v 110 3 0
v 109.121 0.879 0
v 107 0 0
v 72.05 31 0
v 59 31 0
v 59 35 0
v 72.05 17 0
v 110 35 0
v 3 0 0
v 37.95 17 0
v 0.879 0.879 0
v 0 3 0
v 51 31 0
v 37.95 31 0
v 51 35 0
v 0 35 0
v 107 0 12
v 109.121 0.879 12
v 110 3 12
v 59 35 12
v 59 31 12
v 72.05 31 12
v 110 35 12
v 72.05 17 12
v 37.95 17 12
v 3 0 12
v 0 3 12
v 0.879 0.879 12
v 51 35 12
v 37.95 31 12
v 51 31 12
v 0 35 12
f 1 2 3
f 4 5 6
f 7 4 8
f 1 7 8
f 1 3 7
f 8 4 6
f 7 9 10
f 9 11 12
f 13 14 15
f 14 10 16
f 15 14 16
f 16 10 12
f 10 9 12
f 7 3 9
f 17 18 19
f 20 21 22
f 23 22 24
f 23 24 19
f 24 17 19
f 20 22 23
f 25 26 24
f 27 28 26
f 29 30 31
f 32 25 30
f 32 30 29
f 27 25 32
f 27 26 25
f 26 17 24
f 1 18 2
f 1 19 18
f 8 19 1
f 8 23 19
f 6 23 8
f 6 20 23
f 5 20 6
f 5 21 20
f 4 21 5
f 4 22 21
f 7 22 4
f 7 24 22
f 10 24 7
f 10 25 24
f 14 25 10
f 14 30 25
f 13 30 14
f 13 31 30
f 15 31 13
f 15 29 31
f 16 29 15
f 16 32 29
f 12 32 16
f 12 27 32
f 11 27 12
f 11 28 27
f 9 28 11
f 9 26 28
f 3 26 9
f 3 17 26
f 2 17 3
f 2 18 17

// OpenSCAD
$fn = 32;

// ----------------------------------------------------------------------
// Window plate: 110 x 35 mm, 1 open windows
// ----------------------------------------------------------------------

// --- parameters (mm) ---
profile_height = 12;      // extrusion height
profile_points = 16;      // points of the closed outline

profile = [[0, 3], [0.879, 0.879], [3, 0], [107, 0], [109.121, 0.879], [110, 3], [110, 35], [59, 35], [59, 31], [72.05, 31], [72.05, 17], [37.95, 17], [37.95, 31], [51, 31], [51, 35], [0, 35]];  // single closed polygon, 16 points, counter clockwise

// --- the one profile operation ---
linear_extrude(height = profile_height) polygon(points = profile);
